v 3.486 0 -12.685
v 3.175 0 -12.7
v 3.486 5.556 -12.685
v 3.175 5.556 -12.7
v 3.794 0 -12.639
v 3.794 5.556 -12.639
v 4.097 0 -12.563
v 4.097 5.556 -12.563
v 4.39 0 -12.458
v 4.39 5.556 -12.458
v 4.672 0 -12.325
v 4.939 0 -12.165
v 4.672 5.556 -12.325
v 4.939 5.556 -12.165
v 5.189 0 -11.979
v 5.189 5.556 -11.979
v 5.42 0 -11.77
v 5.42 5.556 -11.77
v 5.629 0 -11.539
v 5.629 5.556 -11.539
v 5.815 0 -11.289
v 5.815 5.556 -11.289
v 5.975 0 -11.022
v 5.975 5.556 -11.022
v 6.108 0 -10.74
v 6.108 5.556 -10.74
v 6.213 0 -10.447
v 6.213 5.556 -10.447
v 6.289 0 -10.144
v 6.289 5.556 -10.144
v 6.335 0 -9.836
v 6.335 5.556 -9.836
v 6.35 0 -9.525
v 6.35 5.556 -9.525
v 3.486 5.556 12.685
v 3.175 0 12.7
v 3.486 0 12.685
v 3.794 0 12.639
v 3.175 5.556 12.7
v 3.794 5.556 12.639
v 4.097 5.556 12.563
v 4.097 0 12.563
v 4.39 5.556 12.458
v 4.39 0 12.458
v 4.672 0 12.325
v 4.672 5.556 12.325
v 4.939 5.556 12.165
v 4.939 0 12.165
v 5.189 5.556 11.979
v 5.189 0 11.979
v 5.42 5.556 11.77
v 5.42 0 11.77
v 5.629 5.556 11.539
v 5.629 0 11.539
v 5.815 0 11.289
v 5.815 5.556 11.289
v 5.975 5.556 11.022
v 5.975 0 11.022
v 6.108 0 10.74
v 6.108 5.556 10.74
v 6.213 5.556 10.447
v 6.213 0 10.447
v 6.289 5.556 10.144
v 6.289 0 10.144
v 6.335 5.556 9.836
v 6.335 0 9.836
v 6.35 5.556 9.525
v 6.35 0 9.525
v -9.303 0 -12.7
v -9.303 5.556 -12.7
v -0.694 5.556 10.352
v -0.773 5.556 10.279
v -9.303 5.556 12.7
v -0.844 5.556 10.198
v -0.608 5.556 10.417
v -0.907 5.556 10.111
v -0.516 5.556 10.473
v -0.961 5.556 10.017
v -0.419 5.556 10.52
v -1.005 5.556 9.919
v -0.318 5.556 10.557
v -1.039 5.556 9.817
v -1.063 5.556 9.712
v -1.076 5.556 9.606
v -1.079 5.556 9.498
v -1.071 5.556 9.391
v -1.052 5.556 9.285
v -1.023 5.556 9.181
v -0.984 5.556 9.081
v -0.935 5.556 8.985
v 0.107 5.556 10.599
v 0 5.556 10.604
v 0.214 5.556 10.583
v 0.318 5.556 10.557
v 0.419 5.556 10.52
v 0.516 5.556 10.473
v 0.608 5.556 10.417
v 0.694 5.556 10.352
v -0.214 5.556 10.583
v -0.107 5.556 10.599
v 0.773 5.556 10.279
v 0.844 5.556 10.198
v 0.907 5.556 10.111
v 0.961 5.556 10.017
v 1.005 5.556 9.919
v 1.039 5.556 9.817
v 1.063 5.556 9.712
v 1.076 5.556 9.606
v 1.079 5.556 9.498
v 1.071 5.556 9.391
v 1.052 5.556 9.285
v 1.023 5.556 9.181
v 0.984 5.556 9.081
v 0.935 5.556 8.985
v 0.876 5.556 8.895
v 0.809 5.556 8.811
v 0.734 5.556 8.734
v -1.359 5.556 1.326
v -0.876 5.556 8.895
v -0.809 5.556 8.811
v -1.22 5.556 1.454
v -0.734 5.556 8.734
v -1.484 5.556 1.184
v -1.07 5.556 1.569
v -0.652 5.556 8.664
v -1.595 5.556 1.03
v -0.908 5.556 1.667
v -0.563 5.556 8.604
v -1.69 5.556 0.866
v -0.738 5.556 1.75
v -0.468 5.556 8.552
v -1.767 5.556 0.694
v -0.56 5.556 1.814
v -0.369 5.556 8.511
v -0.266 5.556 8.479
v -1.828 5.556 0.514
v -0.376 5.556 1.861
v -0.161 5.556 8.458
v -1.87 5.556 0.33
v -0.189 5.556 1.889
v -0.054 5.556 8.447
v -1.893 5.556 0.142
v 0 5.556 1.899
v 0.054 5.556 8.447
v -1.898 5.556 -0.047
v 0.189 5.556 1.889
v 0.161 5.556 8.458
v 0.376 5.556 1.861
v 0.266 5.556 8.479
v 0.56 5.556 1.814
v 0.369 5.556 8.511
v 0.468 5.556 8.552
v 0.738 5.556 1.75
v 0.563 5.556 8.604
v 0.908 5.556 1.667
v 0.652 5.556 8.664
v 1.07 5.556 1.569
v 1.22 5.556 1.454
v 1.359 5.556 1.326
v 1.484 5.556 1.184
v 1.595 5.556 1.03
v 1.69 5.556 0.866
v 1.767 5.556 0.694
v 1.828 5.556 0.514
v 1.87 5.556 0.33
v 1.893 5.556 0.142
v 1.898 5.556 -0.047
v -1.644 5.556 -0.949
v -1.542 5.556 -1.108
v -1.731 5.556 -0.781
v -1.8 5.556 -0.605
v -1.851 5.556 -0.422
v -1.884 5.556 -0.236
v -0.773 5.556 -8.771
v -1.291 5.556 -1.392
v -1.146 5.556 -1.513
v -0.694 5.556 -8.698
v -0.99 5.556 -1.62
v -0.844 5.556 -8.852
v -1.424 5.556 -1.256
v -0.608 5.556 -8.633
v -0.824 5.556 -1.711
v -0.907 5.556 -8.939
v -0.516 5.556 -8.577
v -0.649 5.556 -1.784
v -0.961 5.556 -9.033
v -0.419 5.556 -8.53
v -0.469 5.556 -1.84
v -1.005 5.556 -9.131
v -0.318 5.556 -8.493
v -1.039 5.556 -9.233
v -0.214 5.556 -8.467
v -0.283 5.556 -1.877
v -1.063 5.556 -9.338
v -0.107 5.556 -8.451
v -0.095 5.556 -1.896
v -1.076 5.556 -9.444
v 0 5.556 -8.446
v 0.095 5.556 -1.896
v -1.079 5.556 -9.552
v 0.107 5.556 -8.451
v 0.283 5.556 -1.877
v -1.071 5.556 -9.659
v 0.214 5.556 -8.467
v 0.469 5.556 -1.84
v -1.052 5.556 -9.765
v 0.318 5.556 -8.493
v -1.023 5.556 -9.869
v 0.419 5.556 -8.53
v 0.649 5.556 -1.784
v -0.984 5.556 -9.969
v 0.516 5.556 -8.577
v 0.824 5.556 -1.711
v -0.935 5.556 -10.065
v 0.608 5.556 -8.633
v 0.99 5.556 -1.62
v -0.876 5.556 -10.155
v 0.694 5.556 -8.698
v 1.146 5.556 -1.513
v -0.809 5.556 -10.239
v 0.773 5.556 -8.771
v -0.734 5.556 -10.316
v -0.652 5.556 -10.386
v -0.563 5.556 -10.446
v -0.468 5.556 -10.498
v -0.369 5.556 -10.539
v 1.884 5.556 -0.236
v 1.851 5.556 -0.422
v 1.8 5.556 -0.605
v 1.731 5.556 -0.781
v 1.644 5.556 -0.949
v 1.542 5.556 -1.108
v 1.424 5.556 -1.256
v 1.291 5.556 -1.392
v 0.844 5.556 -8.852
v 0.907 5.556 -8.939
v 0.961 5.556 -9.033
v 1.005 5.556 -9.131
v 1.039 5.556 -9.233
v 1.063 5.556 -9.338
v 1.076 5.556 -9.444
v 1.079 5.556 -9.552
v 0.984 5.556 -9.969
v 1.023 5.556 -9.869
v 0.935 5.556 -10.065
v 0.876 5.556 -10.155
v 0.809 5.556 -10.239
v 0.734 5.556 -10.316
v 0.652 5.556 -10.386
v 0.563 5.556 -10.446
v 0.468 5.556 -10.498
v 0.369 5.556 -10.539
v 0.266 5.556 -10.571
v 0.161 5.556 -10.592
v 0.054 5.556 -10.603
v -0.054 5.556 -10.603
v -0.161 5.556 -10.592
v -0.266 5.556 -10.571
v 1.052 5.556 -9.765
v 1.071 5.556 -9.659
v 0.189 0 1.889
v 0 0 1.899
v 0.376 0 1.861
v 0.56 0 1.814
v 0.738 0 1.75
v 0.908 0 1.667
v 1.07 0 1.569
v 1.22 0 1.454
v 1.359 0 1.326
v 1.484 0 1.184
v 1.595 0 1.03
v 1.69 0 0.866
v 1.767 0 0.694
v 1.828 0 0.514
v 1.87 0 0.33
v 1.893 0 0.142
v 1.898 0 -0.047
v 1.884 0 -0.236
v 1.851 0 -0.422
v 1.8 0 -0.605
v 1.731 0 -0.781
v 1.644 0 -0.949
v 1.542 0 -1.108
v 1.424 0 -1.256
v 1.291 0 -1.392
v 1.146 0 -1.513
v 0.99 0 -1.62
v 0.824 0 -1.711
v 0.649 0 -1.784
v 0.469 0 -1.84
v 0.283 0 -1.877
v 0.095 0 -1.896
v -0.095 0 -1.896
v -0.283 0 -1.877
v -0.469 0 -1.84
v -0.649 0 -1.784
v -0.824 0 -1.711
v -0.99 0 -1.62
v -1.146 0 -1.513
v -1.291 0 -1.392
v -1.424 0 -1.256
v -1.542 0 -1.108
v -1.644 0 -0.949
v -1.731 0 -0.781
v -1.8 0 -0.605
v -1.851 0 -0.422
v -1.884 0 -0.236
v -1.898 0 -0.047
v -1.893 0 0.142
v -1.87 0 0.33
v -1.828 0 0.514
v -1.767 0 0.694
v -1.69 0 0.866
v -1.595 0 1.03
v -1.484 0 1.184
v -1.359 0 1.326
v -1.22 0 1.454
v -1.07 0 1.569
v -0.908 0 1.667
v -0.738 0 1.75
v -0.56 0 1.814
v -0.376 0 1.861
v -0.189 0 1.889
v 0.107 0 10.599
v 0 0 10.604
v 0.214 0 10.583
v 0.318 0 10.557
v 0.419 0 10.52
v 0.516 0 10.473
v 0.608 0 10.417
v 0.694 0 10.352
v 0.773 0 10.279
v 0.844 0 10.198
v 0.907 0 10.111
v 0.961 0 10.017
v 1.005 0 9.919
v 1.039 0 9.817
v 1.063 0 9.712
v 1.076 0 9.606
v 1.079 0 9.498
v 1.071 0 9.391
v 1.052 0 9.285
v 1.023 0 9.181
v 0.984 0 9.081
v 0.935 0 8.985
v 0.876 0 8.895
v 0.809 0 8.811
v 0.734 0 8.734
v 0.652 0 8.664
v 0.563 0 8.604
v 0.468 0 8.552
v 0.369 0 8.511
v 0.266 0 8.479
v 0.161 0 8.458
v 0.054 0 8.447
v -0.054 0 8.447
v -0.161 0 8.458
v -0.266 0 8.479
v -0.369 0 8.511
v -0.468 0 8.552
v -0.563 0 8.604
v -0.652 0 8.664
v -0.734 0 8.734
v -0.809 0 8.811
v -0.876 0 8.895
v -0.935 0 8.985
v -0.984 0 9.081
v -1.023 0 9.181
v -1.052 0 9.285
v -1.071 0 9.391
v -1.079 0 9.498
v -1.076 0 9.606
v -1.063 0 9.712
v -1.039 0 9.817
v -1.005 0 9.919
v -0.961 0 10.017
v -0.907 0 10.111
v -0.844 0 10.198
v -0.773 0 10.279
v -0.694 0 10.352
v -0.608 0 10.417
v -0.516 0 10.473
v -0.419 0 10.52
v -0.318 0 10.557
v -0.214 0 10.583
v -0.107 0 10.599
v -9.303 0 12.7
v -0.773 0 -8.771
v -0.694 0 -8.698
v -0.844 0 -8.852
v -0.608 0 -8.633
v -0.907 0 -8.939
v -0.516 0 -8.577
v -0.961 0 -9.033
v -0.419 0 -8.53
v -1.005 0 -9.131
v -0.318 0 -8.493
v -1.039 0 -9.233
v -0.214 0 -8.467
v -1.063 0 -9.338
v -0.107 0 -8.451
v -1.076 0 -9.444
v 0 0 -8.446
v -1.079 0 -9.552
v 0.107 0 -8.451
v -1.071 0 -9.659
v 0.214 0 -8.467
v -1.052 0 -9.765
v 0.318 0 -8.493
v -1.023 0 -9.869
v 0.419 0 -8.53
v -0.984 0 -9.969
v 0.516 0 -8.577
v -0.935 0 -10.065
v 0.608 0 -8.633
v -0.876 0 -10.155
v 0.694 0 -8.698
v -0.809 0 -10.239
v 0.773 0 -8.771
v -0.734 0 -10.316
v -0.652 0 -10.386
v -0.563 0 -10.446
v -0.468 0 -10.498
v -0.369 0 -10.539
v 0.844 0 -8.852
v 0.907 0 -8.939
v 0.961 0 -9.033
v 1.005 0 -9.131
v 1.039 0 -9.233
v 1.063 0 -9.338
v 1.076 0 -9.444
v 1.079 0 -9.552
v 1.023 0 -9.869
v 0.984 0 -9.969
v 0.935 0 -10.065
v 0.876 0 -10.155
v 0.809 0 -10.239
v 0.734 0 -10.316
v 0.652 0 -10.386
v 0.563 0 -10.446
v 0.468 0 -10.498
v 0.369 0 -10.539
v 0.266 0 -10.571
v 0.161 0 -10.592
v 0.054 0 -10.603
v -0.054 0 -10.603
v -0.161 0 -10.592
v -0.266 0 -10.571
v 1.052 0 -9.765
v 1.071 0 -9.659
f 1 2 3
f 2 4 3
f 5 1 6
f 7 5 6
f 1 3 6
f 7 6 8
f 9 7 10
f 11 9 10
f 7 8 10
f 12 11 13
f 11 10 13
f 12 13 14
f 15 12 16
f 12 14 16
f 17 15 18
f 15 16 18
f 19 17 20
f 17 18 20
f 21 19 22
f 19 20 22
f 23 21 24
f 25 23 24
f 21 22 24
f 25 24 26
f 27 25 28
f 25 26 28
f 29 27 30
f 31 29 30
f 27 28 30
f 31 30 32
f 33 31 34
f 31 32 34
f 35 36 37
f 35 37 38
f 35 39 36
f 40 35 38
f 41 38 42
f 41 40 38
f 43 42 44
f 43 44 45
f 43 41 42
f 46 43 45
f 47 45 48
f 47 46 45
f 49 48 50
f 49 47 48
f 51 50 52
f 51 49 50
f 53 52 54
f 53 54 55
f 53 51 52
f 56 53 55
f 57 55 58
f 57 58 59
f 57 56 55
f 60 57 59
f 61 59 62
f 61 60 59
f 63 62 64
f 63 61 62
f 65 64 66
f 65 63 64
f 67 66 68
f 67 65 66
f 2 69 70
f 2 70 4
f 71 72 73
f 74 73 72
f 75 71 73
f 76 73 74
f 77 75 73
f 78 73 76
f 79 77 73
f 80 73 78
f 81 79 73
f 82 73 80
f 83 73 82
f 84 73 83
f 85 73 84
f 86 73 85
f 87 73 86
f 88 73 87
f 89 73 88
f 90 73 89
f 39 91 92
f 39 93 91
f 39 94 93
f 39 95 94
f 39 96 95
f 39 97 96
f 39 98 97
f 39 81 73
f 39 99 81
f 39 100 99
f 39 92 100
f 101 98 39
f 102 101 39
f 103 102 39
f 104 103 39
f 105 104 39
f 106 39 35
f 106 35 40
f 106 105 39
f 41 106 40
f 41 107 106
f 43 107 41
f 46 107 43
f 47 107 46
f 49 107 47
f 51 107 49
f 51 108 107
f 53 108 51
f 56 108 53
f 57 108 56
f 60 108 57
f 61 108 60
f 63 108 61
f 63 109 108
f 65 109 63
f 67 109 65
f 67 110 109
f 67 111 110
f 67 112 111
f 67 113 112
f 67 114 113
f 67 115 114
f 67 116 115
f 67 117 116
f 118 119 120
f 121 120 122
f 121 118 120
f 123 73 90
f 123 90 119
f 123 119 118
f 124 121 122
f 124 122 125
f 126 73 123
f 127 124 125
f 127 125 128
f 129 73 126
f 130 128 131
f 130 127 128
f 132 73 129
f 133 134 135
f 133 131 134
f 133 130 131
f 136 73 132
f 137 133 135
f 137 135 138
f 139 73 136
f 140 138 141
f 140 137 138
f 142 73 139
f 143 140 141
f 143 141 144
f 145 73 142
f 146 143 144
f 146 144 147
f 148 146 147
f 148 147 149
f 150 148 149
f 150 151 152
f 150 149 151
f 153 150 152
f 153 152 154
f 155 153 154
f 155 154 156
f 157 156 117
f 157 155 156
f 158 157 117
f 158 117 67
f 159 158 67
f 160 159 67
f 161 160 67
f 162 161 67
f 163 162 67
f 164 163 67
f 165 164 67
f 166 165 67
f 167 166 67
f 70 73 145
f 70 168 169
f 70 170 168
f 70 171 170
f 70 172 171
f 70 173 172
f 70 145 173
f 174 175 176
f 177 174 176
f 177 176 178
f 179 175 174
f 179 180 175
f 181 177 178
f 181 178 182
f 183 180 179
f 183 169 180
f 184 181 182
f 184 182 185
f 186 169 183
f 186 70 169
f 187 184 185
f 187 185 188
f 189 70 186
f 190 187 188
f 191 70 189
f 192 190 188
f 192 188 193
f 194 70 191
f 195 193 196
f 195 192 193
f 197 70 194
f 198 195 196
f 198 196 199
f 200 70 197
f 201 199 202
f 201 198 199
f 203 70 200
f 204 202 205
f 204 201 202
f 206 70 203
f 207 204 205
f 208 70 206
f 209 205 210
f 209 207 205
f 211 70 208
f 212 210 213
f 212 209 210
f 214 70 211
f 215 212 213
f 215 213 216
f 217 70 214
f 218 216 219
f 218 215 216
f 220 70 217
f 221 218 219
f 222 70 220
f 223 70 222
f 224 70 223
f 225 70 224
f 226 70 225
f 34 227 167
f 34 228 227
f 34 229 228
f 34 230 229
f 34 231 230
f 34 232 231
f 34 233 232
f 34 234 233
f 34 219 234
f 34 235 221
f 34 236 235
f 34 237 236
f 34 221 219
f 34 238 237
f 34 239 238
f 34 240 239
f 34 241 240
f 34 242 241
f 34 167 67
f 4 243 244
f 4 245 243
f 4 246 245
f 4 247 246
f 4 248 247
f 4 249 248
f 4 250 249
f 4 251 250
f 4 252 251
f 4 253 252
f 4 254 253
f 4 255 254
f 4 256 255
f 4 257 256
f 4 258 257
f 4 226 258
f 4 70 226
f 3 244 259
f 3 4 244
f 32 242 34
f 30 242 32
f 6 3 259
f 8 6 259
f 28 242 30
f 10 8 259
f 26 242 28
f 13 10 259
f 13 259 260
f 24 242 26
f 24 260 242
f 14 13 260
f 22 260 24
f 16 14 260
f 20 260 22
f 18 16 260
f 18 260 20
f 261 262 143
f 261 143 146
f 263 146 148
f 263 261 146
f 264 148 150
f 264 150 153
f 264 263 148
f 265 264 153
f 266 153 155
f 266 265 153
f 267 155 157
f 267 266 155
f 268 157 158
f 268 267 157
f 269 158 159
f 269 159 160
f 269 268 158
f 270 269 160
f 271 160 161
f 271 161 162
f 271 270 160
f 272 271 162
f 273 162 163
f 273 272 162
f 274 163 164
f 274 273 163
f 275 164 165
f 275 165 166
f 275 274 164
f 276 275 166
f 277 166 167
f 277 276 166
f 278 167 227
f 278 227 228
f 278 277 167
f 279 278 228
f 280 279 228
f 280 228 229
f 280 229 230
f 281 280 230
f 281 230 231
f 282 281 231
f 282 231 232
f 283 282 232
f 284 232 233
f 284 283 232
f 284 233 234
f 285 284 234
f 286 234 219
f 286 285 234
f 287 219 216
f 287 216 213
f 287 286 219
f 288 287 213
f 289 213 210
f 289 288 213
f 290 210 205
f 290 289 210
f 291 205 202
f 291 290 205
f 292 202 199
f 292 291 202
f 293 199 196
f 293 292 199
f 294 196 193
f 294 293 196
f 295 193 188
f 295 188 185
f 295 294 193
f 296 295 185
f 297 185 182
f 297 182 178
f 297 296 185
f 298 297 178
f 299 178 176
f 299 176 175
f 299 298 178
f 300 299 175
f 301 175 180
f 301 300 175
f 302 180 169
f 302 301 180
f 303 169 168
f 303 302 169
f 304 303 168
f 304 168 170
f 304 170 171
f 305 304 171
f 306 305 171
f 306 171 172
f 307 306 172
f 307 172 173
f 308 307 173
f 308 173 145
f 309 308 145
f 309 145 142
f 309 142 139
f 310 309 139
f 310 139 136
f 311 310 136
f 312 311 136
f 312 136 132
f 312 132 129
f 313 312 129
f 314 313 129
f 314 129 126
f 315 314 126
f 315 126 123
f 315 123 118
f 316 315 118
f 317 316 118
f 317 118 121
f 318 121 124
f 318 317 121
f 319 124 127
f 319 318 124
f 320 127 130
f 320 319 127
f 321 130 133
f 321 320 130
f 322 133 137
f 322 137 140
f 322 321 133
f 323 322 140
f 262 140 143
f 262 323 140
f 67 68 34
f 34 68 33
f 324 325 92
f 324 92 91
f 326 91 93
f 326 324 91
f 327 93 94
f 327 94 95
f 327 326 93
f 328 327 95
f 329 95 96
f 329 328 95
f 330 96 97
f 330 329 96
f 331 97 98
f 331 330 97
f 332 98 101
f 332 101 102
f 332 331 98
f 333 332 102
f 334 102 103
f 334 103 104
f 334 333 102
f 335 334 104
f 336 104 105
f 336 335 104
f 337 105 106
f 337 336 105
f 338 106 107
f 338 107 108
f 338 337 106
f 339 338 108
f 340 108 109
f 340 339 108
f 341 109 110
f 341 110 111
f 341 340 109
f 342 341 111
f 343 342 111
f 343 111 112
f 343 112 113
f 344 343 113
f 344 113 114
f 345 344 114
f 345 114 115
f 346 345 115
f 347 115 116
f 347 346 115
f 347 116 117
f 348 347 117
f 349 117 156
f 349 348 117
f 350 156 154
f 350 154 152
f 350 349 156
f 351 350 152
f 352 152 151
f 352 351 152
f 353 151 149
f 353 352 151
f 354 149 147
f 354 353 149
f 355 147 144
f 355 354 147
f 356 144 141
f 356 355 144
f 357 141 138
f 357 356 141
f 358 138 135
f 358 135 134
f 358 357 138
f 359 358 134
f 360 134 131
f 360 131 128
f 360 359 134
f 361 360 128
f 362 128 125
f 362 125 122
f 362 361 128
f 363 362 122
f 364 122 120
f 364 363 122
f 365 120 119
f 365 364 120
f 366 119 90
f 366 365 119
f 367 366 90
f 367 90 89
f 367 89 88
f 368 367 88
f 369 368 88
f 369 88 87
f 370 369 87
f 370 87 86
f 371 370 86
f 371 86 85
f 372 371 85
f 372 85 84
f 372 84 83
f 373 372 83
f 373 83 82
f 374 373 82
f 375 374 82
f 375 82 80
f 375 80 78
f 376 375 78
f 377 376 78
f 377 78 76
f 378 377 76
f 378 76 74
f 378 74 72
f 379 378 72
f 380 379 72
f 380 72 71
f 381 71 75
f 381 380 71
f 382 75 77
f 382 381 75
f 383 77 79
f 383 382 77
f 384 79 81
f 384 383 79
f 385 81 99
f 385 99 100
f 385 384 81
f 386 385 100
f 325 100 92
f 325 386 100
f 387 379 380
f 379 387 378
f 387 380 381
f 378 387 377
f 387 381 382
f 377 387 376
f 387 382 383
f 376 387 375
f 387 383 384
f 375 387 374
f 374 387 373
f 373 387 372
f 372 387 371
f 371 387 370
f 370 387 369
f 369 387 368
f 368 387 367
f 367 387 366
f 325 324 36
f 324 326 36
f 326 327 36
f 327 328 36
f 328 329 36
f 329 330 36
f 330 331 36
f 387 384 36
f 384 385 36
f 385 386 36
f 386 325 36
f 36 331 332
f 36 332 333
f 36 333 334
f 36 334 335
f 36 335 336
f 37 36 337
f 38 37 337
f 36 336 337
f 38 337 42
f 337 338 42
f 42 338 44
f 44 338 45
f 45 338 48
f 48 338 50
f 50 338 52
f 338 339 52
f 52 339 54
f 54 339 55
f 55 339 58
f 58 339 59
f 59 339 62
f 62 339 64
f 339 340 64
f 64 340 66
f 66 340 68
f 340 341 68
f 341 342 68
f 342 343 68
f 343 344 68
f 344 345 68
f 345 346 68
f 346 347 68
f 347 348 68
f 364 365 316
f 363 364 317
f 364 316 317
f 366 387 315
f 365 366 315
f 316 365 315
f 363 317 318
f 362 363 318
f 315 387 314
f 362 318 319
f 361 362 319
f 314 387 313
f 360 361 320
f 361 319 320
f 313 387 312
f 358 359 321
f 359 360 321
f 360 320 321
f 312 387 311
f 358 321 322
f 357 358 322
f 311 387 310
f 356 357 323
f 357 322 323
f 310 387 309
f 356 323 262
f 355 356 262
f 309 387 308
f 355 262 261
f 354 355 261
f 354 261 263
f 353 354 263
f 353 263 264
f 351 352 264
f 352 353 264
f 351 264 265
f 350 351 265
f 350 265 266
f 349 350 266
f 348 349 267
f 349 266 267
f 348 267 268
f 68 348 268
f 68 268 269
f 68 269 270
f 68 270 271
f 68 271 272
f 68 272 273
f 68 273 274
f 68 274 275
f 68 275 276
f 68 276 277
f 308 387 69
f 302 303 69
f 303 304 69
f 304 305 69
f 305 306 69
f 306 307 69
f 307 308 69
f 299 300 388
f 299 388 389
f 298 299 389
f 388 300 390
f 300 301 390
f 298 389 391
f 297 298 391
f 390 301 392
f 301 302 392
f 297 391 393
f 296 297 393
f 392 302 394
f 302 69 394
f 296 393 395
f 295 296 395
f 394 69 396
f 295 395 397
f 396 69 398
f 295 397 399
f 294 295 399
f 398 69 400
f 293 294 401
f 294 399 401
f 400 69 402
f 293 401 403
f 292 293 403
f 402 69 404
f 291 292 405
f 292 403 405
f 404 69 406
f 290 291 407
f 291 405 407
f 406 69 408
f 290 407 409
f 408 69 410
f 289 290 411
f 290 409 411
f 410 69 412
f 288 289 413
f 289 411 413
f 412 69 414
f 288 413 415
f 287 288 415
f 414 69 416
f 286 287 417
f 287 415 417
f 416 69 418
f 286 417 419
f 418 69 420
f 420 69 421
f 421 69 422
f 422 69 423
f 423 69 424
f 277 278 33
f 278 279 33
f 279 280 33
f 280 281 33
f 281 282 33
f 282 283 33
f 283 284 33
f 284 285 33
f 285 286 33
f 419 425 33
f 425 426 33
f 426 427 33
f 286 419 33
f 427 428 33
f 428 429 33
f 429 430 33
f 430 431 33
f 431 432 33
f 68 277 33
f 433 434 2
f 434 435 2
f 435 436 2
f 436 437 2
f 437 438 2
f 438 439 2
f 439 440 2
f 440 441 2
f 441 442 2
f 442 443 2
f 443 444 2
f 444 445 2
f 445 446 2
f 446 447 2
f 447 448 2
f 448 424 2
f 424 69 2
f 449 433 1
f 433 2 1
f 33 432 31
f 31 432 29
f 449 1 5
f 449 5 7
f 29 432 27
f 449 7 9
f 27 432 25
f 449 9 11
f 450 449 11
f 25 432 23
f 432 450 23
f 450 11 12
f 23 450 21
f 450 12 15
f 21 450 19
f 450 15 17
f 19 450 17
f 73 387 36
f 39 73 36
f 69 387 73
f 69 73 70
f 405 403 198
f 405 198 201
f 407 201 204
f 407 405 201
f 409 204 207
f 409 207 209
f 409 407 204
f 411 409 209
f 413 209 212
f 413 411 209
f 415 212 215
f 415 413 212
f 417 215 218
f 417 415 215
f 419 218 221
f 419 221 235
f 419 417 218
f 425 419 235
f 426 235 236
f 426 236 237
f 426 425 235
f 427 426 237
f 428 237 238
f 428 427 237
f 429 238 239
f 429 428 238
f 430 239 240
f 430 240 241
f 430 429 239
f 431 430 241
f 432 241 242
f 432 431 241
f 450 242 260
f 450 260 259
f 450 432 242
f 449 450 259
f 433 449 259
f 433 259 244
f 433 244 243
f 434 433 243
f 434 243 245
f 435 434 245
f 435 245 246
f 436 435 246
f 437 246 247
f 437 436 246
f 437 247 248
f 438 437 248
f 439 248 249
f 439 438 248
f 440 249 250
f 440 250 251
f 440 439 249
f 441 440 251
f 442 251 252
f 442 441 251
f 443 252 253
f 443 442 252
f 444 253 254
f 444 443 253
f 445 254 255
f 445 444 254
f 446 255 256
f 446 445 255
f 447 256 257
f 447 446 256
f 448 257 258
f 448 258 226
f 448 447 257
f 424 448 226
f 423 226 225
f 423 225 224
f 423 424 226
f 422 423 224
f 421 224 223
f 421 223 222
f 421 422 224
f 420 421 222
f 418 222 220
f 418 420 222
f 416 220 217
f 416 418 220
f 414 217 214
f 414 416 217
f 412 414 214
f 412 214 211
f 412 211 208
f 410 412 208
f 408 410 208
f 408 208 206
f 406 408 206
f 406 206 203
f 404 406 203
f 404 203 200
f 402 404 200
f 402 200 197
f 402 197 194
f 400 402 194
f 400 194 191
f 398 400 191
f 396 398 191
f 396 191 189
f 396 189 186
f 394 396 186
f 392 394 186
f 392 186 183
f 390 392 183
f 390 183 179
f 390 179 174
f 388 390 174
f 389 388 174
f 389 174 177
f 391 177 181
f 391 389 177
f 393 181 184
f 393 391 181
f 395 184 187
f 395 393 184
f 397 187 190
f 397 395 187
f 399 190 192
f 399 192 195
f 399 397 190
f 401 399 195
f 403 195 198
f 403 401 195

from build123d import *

# Parameters (mm, degrees)
SKETCH1_W      = 15.65275
SKETCH1_H      = 25.4
SKETCH1_R      = 1.89865
SKETCH1_R_2    = 1.0795
EXTRUDE1_DEPTH = 5.55625
FILLET1_R      = 3.175


with BuildPart() as part:
    # Sketch1 → Extrude1 (new body)
    with BuildSketch(Plane(origin=(0, 0, 0), x_dir=(1, 0, 0), z_dir=(0, 1, 0))):
        with Locations((-1.476375, 0)):
            Rectangle(SKETCH1_W, SKETCH1_H)
        with Locations(Location((0, 0, 0), (0, 0, 270))):
            Circle(SKETCH1_R, mode=Mode.SUBTRACT)
        with Locations(Location((0, 9.525, 0), (0, 0, 270))):
            Circle(SKETCH1_R_2, mode=Mode.SUBTRACT)
        with Locations(Location((0, -9.525, 0), (0, 0, 270))):
            Circle(SKETCH1_R_2, mode=Mode.SUBTRACT)
    extrude(amount=EXTRUDE1_DEPTH)

    # Fillet1
    fillet1_edges = [part.edges().sort_by_distance(p)[0] for p in [
        (6.35, 2.778125, -12.7),
        (6.35, 2.778125, 12.7),
    ]]
    fillet(fillet1_edges, radius=FILLET1_R)


solid = part.part
